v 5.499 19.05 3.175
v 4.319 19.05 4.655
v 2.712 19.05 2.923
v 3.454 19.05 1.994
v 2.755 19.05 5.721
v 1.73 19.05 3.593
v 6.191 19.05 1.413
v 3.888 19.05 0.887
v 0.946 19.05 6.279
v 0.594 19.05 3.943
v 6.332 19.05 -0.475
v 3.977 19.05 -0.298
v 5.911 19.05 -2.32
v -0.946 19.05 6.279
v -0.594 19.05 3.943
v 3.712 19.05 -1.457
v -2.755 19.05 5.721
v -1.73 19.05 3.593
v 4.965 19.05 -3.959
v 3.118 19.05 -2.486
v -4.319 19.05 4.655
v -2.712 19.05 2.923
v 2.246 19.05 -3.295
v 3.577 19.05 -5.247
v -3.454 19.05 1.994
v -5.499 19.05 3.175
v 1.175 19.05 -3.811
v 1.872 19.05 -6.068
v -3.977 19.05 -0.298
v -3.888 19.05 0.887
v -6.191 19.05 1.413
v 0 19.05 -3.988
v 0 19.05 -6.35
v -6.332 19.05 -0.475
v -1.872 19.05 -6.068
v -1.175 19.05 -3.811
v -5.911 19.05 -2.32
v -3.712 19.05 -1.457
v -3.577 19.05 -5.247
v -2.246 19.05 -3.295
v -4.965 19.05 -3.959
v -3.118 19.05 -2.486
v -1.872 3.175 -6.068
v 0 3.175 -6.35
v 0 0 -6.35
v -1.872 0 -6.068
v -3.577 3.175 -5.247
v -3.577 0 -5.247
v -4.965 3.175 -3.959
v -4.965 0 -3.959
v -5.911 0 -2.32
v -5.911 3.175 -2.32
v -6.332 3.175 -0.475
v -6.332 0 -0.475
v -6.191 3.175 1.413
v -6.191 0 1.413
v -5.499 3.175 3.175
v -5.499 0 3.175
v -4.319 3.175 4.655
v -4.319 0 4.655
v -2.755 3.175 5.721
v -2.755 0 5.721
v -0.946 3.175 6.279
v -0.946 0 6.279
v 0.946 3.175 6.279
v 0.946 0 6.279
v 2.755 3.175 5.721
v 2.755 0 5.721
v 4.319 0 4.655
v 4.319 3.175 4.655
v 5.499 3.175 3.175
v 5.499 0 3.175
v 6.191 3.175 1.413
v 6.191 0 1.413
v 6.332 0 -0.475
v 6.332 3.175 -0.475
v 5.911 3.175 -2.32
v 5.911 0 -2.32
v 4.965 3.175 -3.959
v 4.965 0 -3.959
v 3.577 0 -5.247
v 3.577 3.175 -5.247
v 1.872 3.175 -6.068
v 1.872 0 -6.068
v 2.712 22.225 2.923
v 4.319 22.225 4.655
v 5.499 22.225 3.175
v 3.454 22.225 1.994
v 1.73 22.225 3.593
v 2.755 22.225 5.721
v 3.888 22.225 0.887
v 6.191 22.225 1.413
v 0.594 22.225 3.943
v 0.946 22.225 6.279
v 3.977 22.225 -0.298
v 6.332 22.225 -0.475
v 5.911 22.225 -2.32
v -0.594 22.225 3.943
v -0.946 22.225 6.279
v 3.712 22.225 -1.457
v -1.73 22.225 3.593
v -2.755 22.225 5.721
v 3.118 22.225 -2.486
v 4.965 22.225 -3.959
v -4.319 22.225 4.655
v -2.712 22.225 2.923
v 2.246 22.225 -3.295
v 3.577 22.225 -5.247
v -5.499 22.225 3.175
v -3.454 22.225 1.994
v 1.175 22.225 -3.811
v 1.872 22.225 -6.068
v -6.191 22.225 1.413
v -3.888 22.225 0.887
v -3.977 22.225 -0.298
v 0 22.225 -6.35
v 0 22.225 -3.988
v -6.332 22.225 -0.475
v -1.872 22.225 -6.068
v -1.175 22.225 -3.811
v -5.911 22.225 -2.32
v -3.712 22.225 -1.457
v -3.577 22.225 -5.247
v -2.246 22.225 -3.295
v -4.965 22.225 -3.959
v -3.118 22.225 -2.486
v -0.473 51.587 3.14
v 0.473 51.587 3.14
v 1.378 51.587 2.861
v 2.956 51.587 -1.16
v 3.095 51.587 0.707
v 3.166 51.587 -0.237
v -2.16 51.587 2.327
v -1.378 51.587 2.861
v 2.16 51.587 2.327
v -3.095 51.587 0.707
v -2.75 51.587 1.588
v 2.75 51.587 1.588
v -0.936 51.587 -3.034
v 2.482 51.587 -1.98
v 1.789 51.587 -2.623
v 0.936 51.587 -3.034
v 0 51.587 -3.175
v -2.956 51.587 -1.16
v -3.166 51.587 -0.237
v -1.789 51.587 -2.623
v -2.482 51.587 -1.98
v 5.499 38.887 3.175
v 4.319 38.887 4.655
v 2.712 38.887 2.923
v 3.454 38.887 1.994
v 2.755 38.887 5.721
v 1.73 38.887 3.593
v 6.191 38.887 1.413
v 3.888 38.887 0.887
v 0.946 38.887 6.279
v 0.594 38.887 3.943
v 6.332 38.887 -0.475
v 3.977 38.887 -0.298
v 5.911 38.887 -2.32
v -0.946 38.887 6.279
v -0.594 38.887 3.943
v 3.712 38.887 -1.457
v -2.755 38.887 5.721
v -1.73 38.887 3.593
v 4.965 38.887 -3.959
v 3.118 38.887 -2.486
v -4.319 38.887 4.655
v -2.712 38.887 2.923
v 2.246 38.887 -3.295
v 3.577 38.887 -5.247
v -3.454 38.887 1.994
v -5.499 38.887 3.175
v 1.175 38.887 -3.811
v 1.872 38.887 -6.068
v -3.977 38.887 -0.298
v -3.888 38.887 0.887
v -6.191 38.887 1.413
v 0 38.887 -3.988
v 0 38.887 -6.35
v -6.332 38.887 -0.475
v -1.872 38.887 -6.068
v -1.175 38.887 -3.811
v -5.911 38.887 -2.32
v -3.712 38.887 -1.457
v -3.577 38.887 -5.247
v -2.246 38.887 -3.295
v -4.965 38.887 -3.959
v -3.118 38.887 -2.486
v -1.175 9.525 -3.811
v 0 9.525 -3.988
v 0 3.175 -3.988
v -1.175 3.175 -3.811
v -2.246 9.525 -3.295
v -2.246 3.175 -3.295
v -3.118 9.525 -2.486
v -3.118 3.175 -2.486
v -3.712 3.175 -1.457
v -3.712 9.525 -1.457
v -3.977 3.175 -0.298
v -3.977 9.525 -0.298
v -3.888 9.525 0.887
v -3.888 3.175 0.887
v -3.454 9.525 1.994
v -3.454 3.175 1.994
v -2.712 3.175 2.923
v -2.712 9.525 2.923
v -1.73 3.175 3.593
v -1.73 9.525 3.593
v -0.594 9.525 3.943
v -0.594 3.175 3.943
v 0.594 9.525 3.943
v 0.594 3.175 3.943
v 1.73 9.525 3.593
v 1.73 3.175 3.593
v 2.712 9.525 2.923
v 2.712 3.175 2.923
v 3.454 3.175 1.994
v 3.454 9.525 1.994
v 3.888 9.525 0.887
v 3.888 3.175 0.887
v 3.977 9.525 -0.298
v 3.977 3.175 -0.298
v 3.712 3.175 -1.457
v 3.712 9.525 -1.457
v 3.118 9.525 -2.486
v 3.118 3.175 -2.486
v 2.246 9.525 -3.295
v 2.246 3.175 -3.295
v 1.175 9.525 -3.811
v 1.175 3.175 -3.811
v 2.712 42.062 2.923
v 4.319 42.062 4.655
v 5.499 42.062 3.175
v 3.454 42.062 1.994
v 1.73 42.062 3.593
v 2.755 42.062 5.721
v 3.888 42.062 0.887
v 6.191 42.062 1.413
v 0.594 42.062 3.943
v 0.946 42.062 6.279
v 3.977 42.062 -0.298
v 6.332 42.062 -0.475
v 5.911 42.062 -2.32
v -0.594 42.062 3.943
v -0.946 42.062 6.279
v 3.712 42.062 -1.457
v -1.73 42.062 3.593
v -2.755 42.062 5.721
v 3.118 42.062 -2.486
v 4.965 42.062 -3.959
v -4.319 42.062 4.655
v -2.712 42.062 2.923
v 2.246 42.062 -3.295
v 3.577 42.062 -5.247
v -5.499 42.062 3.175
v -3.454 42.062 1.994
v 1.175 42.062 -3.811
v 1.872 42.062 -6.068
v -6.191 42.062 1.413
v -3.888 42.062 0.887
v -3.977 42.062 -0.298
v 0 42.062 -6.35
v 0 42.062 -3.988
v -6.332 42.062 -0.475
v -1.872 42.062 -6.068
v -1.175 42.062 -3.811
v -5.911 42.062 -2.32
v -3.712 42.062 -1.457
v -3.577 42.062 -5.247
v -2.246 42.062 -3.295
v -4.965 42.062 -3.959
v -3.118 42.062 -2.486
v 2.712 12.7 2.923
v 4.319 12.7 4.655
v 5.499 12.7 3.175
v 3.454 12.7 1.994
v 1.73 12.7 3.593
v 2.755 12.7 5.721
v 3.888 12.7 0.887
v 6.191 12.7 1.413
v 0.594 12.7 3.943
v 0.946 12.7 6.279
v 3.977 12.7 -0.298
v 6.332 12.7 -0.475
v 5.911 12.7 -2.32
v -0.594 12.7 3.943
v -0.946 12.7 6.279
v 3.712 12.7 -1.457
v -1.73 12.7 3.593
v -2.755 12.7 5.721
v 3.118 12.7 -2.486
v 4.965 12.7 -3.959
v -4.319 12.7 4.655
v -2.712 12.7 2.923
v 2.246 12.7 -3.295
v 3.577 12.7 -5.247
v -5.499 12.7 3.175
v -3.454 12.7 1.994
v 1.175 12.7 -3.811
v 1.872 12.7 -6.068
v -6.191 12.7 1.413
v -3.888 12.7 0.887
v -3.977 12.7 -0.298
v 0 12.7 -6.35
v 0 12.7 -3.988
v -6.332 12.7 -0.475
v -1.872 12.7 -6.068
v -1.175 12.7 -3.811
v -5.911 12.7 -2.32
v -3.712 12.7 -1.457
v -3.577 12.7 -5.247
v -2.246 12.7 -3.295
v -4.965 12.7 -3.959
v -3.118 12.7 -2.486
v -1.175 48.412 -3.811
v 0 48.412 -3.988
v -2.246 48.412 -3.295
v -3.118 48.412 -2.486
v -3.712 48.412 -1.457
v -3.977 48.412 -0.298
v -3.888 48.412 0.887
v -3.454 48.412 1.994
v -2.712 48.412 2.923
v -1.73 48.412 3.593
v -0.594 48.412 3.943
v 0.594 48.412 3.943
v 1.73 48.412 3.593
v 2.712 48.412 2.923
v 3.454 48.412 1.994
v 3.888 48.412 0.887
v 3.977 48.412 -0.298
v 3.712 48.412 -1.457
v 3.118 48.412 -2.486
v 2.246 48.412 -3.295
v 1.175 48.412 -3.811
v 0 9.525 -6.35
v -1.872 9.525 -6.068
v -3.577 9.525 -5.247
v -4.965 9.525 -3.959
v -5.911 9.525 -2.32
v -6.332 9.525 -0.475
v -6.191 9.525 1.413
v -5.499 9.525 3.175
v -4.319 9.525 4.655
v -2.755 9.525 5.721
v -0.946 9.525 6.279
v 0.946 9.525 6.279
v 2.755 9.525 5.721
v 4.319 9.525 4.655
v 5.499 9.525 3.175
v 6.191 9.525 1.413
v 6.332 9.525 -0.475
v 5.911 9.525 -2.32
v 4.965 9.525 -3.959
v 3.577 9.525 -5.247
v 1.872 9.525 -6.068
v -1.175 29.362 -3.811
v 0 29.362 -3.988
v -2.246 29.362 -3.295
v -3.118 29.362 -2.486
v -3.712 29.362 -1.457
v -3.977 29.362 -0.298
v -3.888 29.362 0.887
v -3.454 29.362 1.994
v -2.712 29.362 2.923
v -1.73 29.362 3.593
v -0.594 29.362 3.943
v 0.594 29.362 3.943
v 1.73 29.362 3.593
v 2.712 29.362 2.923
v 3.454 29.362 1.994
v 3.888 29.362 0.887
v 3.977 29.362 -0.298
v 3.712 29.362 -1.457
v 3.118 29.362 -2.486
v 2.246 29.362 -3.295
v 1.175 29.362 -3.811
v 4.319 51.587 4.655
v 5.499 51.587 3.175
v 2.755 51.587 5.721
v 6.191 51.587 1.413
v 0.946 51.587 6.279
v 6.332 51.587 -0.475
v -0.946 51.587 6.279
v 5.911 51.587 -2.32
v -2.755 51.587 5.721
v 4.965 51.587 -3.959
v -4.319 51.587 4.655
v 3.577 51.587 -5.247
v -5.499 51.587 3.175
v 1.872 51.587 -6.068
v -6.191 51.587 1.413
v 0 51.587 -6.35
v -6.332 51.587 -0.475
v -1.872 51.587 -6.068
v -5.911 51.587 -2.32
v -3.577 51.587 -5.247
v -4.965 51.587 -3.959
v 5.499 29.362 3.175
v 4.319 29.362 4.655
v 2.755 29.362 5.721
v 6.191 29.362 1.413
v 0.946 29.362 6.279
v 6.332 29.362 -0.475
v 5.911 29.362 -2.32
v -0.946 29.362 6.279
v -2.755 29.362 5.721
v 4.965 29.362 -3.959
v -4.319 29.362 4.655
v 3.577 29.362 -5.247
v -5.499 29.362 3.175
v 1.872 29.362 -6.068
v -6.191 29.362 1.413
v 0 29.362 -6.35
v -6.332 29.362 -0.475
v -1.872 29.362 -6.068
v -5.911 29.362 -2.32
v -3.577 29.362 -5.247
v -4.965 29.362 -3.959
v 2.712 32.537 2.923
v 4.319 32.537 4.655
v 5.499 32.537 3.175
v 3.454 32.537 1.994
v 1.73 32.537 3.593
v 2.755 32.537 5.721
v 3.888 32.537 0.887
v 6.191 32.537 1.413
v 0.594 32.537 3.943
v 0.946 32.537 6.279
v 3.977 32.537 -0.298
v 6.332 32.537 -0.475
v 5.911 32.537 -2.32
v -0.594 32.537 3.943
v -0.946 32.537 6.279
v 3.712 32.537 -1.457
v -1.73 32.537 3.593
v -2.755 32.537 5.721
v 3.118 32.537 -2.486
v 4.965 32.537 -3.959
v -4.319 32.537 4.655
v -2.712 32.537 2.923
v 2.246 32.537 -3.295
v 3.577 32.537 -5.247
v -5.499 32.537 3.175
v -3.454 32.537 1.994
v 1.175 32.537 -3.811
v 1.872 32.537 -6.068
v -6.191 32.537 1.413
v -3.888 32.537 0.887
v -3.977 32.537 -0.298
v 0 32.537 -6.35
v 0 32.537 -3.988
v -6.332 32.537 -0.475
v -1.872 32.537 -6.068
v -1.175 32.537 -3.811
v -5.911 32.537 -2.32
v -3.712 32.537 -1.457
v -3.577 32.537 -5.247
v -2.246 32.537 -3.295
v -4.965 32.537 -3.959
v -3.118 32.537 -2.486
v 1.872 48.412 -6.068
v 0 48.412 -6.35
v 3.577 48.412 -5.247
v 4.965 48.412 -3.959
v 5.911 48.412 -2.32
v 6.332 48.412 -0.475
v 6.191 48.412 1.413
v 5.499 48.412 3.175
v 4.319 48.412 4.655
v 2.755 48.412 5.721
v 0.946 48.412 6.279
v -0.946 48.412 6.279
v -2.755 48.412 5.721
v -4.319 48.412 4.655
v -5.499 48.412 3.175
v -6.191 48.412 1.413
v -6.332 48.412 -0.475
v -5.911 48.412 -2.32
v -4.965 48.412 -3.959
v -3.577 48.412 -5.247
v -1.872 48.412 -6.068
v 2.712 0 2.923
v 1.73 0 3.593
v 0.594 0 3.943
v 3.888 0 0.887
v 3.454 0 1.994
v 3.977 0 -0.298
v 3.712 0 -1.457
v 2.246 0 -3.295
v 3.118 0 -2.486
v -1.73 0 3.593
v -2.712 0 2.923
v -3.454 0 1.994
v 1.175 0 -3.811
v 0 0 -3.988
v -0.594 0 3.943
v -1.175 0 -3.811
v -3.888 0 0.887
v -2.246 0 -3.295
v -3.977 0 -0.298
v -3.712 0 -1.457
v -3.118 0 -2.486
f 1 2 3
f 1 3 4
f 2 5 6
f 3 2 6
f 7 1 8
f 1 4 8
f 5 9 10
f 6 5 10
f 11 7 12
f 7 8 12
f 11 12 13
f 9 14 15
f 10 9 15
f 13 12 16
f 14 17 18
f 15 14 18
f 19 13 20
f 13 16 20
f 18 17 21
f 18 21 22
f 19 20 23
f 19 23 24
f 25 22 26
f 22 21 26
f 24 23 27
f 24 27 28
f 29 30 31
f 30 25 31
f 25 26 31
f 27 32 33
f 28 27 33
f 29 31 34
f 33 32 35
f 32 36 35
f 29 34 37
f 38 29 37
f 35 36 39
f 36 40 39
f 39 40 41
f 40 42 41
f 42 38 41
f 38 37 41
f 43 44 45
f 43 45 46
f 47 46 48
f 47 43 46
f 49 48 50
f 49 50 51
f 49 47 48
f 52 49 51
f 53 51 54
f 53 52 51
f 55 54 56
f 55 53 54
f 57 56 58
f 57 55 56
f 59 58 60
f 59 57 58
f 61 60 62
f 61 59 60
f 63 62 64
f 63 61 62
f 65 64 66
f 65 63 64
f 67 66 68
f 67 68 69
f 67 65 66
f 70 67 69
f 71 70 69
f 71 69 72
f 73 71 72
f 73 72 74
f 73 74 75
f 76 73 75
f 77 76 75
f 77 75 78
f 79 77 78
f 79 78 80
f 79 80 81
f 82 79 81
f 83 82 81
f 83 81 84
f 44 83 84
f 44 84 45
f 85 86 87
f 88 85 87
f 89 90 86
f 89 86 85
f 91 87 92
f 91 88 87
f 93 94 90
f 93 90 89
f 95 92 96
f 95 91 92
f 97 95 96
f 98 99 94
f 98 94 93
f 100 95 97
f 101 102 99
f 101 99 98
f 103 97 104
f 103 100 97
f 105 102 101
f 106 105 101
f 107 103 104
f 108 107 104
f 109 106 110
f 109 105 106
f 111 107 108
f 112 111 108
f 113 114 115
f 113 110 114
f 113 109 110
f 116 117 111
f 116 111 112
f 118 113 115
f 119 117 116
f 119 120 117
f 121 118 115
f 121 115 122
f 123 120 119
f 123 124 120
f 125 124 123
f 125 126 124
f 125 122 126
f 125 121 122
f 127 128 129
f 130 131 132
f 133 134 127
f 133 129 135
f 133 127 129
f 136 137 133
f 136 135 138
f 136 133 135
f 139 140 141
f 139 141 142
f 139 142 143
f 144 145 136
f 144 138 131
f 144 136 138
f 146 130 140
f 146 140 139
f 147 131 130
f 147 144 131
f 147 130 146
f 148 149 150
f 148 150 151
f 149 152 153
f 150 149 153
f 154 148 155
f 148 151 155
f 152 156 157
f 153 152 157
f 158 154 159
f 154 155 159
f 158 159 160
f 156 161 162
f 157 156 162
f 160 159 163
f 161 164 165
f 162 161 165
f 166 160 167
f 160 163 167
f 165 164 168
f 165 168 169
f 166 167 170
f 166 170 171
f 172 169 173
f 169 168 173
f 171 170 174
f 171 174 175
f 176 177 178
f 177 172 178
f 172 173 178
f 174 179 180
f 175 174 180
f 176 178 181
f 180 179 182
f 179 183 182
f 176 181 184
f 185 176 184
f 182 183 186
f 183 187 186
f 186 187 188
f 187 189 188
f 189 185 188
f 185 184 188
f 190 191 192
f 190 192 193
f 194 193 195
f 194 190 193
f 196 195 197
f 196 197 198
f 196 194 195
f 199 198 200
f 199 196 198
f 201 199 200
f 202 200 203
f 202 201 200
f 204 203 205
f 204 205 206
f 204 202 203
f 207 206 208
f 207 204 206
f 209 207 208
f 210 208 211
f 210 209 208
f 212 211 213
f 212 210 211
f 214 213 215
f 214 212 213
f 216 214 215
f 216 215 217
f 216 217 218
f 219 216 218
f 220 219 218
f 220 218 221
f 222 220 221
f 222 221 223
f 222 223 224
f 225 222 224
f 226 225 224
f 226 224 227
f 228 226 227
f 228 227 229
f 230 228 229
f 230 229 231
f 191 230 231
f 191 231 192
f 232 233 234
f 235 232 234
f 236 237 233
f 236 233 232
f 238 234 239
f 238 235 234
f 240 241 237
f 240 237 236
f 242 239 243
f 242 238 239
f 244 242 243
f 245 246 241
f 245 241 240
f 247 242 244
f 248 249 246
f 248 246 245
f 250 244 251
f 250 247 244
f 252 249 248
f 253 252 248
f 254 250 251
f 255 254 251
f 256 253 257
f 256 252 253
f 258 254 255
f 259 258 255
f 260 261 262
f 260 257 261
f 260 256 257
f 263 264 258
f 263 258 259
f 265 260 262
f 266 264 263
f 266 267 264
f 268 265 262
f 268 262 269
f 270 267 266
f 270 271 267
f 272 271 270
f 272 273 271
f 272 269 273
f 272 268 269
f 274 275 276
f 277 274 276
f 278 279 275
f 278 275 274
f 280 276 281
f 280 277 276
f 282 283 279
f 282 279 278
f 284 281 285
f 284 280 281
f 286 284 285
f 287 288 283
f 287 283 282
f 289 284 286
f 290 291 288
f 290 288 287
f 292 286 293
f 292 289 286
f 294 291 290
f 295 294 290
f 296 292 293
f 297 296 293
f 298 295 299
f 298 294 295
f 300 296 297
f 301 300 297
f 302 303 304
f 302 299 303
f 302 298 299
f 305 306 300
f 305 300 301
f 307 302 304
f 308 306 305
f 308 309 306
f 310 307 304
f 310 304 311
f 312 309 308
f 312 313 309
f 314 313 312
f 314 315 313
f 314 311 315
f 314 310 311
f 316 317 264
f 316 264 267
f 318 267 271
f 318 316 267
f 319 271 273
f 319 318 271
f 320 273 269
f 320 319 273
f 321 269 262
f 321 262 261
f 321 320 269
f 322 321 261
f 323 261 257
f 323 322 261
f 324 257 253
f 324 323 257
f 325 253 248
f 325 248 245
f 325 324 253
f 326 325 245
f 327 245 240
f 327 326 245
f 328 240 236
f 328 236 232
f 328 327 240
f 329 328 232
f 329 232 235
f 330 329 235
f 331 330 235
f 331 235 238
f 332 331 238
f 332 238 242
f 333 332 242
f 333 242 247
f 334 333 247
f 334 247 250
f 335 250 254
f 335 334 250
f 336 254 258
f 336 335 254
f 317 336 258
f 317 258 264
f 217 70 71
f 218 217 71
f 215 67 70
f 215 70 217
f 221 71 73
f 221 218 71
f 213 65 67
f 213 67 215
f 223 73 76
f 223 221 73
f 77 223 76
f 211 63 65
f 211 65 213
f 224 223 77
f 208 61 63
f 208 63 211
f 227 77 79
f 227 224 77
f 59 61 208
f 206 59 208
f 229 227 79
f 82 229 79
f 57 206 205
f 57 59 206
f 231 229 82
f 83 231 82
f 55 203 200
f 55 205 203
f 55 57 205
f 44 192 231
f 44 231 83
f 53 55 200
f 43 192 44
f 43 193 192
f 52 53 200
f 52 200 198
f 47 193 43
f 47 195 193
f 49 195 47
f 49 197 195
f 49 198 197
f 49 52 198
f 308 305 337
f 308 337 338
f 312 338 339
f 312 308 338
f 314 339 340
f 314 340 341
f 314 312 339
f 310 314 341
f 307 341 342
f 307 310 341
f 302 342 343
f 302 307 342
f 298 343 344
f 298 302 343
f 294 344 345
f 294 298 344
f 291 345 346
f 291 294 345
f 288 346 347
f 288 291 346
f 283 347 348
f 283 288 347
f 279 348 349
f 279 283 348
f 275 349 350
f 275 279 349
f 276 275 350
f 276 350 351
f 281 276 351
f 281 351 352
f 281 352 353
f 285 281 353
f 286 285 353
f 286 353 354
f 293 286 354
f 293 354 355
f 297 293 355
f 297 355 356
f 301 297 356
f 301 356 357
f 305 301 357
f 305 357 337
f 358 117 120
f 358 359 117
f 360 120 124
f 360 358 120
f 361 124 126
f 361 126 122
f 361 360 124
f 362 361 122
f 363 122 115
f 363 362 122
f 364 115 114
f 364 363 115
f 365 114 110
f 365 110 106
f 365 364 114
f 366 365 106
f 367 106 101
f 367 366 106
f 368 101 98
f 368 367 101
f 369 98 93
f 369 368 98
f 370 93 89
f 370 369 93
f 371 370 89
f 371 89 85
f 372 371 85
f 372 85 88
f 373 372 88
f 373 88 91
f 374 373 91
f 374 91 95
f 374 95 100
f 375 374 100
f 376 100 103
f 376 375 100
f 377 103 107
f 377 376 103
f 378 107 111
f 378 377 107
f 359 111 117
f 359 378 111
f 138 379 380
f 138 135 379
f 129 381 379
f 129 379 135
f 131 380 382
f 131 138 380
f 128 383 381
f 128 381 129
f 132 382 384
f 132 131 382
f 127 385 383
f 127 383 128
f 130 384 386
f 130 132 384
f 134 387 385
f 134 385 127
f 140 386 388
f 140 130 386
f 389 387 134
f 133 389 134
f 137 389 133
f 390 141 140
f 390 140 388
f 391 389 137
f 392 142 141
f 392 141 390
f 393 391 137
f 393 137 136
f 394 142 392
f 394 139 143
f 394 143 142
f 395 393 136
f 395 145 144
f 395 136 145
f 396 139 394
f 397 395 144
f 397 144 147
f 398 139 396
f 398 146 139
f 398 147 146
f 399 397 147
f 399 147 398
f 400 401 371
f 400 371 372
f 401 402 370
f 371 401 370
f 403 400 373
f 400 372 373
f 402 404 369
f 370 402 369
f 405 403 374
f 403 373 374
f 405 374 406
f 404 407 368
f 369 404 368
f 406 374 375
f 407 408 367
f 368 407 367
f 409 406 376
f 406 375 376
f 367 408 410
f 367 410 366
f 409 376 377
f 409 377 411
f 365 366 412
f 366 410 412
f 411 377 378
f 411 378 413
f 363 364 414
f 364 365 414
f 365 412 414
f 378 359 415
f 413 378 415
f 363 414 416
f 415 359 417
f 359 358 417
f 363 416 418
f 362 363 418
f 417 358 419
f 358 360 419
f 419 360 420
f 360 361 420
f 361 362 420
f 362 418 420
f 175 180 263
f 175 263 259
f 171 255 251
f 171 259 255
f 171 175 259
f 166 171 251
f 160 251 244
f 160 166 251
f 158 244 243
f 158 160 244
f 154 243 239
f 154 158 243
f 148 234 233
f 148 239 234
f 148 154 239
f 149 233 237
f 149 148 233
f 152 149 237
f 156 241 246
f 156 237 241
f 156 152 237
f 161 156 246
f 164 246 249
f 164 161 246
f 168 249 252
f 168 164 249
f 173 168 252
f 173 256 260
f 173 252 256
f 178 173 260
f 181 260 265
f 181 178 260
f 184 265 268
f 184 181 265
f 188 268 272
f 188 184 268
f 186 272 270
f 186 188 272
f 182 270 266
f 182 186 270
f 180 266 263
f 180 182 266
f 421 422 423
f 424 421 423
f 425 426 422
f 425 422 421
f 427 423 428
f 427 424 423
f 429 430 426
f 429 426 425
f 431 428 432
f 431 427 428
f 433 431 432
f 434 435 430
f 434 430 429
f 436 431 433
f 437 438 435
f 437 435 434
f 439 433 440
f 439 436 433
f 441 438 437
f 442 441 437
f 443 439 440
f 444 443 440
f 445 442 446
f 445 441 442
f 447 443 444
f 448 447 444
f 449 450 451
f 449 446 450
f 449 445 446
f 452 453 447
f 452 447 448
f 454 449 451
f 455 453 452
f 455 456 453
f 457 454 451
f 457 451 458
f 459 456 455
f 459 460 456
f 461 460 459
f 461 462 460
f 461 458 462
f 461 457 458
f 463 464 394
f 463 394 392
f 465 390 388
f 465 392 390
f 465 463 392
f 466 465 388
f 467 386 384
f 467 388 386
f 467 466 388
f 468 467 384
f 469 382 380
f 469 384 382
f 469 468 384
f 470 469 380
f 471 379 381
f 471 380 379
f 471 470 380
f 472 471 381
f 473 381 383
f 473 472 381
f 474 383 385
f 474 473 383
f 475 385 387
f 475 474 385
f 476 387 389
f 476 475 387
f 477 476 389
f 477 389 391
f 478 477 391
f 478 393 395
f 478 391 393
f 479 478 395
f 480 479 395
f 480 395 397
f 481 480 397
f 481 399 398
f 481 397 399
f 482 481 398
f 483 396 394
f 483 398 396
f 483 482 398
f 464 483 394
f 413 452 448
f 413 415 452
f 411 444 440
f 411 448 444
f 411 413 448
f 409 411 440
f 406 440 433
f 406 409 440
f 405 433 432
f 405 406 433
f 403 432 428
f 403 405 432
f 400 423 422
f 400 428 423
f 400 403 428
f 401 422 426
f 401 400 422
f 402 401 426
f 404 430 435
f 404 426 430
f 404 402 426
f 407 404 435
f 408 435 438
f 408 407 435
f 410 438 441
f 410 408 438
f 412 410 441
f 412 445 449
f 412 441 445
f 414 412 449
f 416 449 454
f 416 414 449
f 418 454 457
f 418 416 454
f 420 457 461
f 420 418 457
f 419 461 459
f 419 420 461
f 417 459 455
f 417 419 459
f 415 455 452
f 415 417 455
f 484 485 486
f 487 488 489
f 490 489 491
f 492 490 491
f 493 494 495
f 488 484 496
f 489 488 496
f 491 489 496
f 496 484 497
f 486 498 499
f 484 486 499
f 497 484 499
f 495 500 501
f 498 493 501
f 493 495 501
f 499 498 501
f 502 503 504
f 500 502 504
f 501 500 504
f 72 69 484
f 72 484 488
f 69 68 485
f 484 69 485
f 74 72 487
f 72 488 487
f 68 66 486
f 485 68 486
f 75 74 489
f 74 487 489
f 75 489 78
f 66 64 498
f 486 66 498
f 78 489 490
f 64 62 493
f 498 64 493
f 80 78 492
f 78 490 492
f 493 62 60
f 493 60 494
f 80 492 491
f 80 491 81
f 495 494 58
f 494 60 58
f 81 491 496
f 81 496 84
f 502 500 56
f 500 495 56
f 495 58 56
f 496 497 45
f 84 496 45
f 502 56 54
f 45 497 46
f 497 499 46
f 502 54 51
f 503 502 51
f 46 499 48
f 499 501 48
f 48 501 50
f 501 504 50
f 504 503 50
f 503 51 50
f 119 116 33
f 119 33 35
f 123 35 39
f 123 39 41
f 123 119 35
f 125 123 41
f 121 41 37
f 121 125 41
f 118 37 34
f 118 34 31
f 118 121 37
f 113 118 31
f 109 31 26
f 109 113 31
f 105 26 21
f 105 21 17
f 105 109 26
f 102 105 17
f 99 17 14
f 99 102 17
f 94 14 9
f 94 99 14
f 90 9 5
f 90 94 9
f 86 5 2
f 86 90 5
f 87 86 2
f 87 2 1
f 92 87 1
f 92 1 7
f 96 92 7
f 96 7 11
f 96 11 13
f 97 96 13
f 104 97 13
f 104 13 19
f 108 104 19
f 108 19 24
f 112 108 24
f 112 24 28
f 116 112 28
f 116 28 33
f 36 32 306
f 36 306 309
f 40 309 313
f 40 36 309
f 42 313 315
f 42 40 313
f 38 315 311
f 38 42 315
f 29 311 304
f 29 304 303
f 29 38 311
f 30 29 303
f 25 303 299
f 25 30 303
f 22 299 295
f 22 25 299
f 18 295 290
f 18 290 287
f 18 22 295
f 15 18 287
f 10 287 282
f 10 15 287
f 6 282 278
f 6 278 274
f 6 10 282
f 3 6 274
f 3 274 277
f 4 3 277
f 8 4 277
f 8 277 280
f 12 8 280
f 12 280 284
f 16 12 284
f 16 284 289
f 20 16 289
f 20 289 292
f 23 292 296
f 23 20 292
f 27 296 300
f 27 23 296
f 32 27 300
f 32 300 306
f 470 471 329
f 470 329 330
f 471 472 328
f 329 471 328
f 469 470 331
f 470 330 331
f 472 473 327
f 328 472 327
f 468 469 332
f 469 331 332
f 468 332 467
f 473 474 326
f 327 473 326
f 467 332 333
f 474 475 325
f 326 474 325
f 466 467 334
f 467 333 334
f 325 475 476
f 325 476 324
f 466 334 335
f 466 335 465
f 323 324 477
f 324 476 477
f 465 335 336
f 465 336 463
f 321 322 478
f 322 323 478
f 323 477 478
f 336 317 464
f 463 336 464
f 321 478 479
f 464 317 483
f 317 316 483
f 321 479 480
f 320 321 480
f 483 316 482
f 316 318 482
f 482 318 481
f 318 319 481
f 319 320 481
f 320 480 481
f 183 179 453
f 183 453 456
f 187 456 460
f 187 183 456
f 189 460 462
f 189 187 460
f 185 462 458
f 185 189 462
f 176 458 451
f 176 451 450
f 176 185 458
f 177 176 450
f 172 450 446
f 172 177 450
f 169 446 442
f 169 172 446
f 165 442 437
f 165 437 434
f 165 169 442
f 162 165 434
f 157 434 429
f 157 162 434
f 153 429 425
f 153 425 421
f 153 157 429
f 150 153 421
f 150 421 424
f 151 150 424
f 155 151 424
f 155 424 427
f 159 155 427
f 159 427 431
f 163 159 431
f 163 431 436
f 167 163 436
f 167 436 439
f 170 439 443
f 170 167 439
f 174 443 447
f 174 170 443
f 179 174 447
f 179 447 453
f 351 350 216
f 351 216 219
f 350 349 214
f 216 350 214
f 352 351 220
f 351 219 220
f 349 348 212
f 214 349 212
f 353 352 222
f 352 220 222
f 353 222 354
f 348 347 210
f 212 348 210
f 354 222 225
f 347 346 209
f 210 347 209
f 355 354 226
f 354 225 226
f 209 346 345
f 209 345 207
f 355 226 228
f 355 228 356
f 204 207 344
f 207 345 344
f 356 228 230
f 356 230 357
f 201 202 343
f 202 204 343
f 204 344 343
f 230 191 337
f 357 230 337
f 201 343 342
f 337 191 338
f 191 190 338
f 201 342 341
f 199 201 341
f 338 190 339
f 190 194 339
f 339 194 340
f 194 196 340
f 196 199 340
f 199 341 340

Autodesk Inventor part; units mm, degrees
ref_plane "YZ Plane" through (0, 0, 0) normal (1, 0, 0) x (0, 1, 0)
ref_plane "XZ Plane" through (0, 0, 0) normal (0, 1, 0) x (-1, 0, 0)
ref_plane "XY Plane" through (0, 0, 0) normal (0, 0, 1) x (1, 0, 0)
sketch "Sketch1" plane through (0, 0, 0) normal (1, 0, 0) x (0, 1, 0)
  line L0 (0, 0) -> (0, -3.9878)
  line L1 (0, -3.9878) -> (0, -6.35)
  line L2 (0, -6.35) -> (3.175, -6.35)
  line L3 (3.175, -6.35) -> (3.175, -3.9878)
  line L4 (9.525, -3.9878) -> (9.525, -6.35)
  line L5 (9.525, -6.35) -> (12.7, -6.35)
  line L6 (12.7, -6.35) -> (12.7, -3.9878)
  line L7 (19.05, -3.9878) -> (19.05, -6.35)
  line L8 (19.05, -6.35) -> (22.225, -6.35)
  line L9 (22.225, -6.35) -> (22.225, -3.9878)
  line L10 (25.7937, 0) -> (0, 0)
  line L11 (51.5874, 0) -> (51.5874, -3.175)
  line L12 (51.5874, -3.175) -> (51.5874, -6.35)
  line L13 (51.5874, -6.35) -> (48.4124, -6.35)
  line L14 (48.4124, -6.35) -> (48.4124, -3.9878)
  line L15 (42.0624, -3.9878) -> (42.0624, -6.35)
  line L16 (42.0624, -6.35) -> (38.8874, -6.35)
  line L17 (38.8874, -6.35) -> (38.8874, -3.9878)
  line L18 (32.5374, -3.9878) -> (32.5374, -6.35)
  line L19 (32.5374, -6.35) -> (29.3624, -6.35)
  line L20 (29.3624, -6.35) -> (29.3624, -3.9878)
  line L21 (25.7937, 0) -> (51.5874, 0)
  line L22 (3.175, -3.9878) -> (9.525, -3.9878)
  line L23 (12.7, -3.9878) -> (19.05, -3.9878)
  line L24 (22.225, -3.9878) -> (29.3624, -3.9878)
  line L25 (32.5374, -3.9878) -> (38.8874, -3.9878)
  line L26 (42.0624, -3.9878) -> (48.4124, -3.9878)
  dimension "d1" = 3.9878
  dimension "d2" = 2.3622
  dimension "d3" = 3.175
  dimension "d5" = 3.175
  dimension "d7" = 3.175
revolve "Revolution1" add sketch "Sketch1" angle 360 about axis through (0, 25.7937, 0) along (0, 1, 0)
properties part number "Crankshaft Crank Cylinder"
